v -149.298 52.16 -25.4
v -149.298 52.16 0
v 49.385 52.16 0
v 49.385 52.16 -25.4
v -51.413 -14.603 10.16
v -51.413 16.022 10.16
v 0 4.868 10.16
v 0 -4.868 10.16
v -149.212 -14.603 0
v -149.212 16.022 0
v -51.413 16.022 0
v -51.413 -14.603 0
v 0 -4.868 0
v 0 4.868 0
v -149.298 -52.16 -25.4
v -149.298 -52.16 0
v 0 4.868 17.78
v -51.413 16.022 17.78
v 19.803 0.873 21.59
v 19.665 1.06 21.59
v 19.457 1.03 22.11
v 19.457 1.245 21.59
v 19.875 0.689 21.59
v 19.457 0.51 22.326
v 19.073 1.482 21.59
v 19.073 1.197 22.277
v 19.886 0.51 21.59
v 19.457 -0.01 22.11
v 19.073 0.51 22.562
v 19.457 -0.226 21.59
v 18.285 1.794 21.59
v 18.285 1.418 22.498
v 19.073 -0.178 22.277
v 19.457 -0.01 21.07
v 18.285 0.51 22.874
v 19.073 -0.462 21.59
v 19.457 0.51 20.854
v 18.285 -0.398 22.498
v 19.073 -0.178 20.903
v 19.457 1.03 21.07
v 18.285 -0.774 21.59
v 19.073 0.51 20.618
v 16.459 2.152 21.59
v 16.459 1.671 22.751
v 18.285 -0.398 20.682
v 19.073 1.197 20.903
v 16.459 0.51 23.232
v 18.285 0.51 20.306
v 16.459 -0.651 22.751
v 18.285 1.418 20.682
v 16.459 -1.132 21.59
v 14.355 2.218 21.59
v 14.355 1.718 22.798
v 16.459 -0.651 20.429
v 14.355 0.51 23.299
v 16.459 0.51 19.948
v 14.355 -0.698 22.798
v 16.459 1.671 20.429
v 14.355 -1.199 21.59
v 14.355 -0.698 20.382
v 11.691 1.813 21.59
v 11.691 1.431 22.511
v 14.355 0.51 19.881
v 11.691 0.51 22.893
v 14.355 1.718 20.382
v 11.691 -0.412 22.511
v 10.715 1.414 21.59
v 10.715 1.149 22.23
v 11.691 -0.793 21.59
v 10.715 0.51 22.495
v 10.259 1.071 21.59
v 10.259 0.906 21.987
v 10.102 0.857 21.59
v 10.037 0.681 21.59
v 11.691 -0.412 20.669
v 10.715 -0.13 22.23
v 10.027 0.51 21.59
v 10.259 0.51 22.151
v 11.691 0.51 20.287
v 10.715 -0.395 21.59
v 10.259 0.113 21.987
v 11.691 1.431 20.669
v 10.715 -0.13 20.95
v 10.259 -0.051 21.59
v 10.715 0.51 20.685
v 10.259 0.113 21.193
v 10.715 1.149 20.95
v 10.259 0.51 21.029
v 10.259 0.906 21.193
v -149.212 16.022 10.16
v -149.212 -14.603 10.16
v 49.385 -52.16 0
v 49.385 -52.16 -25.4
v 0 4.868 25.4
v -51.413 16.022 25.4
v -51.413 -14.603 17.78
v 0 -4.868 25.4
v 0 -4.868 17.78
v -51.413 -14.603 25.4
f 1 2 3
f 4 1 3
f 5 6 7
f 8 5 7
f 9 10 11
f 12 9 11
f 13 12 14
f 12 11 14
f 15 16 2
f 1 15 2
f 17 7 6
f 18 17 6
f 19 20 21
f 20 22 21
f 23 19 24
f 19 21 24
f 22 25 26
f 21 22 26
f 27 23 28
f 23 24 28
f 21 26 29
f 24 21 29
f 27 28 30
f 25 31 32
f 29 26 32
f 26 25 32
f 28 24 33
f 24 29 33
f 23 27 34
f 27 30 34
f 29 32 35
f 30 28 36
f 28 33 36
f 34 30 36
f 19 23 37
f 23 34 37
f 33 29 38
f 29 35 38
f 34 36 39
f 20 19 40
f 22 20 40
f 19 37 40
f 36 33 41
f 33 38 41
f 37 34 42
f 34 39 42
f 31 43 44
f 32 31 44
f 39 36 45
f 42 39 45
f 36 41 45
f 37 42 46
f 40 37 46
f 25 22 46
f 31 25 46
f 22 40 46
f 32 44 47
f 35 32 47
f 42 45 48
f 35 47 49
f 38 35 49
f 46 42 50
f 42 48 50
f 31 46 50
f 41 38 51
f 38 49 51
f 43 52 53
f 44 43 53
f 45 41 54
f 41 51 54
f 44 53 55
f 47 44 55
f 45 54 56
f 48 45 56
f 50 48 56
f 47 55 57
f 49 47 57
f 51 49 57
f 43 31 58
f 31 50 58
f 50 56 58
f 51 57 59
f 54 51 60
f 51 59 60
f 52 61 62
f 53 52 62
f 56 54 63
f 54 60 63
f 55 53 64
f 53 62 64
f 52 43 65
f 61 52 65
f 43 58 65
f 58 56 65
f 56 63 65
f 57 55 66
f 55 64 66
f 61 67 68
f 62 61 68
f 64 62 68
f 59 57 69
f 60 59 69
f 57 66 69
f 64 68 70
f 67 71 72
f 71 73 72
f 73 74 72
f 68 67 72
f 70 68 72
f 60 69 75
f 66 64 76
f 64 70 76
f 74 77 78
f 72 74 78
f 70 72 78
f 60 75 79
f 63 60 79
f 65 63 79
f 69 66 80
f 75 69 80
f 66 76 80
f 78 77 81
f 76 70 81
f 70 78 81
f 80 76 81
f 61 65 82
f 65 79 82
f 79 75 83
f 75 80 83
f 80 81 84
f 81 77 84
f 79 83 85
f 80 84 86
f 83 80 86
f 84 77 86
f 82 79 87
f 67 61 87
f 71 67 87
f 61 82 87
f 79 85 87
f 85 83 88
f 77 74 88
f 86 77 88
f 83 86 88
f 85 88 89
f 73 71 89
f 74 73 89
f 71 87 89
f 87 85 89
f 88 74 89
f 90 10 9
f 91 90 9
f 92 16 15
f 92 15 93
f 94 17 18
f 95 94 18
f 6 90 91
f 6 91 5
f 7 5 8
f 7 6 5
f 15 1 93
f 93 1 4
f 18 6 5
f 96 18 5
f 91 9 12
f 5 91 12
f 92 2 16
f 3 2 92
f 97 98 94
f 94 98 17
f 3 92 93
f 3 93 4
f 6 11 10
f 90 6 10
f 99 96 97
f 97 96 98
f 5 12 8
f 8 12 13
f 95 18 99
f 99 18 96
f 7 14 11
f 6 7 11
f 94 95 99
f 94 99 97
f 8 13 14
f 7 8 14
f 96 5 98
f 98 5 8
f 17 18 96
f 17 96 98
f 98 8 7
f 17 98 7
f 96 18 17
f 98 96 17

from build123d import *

# Parameters (mm, degrees)
F0_W     = 198.6827738583
F0_H     = 104.3191924691
F1_DEPTH = 25.4
F3_DEPTH = 10.16
F5_DEPTH = 7.62
F7_DEPTH = 7.62


# Not quite as in the source:
# - a feature names something its author has since deleted; it is built from what else it names


with BuildPart() as f1:
    # F0 (on Top) → F1 (new body)
    with BuildSketch(Plane.XY):
        with Locations((-49.9562527984, 0)):
            Rectangle(F0_W, F0_H)
    extrude(amount=-F1_DEPTH)


with BuildPart() as f3:
    # F2 (on face) → F3 (new body)
    with BuildSketch(Plane.XY):
        Polygon((0, 4.8675285652), (-51.4132715762, 16.0222817212), (-149.2118090391, 16.0222817212), (-149.2118090391, -14.602586627), (-51.4132715762, -14.602586627), (0, -4.8675285652), align=None)
    extrude(amount=F3_DEPTH)


with BuildPart() as f5:
    # F4 (on face) → F5 (new body)
    with BuildSketch(Plane.XY.offset(10.16)):
        Polygon((0, 4.8675285652), (-51.4132715762, 16.0222817212), (-51.4132715762, -14.602586627), (0, -4.8675285652), align=None)
    extrude(amount=F5_DEPTH)


with BuildPart() as f7:
    # F6 (on face) → F7 (new body)
    with BuildSketch(Plane.XY.offset(17.78)):
        Polygon((0, 4.8675285652), (-51.4132715762, 16.0222817212), (-51.4132715762, -14.602586627), (0, -4.8675285652), align=None)
    extrude(amount=F7_DEPTH)


with BuildPart() as f10:
    # F9 (on offset) → F10 (revolve)
    with BuildSketch(Plane.XY.offset(21.59)):
        with BuildLine():
            add(Edge.make_bspline(
                [(19.8862690043, 0.5098331603), (20.047106034, 2.2035256943), (15.0359997695, 2.2307201746), (10.024893505, 2.2579146549), (10.024893505, 0.5633492838)],
                knots=[3.1094951634, 3.1094951634, 3.1094951634, 4.6963402353, 4.6963402353, 6.2831853072, 6.2831853072, 6.2831853072], degree=2, weights=[1, 0.7014099885, 1, 0.7014099885, 1]))
            add(Edge.make_bspline(
                [(10.024893505, 0.5633492838), (10.024893505, 0.536584329), (10.027433859, 0.5098331603)],
                knots=[0, 0, 0, 0.0320974902, 0.0320974902, 0.0320974902], degree=2, weights=[1, 0.9998712217, 1]))
            Line((10.027433859, 0.5098331603), (19.8862690043, 0.5098331603))
        make_face()
    revolve(axis=Axis((15.8781609207, 0.5098331603, 21.59), (1, 0, 0)))


solid = Compound([f1.part, f3.part, f5.part, f7.part, f10.part])
